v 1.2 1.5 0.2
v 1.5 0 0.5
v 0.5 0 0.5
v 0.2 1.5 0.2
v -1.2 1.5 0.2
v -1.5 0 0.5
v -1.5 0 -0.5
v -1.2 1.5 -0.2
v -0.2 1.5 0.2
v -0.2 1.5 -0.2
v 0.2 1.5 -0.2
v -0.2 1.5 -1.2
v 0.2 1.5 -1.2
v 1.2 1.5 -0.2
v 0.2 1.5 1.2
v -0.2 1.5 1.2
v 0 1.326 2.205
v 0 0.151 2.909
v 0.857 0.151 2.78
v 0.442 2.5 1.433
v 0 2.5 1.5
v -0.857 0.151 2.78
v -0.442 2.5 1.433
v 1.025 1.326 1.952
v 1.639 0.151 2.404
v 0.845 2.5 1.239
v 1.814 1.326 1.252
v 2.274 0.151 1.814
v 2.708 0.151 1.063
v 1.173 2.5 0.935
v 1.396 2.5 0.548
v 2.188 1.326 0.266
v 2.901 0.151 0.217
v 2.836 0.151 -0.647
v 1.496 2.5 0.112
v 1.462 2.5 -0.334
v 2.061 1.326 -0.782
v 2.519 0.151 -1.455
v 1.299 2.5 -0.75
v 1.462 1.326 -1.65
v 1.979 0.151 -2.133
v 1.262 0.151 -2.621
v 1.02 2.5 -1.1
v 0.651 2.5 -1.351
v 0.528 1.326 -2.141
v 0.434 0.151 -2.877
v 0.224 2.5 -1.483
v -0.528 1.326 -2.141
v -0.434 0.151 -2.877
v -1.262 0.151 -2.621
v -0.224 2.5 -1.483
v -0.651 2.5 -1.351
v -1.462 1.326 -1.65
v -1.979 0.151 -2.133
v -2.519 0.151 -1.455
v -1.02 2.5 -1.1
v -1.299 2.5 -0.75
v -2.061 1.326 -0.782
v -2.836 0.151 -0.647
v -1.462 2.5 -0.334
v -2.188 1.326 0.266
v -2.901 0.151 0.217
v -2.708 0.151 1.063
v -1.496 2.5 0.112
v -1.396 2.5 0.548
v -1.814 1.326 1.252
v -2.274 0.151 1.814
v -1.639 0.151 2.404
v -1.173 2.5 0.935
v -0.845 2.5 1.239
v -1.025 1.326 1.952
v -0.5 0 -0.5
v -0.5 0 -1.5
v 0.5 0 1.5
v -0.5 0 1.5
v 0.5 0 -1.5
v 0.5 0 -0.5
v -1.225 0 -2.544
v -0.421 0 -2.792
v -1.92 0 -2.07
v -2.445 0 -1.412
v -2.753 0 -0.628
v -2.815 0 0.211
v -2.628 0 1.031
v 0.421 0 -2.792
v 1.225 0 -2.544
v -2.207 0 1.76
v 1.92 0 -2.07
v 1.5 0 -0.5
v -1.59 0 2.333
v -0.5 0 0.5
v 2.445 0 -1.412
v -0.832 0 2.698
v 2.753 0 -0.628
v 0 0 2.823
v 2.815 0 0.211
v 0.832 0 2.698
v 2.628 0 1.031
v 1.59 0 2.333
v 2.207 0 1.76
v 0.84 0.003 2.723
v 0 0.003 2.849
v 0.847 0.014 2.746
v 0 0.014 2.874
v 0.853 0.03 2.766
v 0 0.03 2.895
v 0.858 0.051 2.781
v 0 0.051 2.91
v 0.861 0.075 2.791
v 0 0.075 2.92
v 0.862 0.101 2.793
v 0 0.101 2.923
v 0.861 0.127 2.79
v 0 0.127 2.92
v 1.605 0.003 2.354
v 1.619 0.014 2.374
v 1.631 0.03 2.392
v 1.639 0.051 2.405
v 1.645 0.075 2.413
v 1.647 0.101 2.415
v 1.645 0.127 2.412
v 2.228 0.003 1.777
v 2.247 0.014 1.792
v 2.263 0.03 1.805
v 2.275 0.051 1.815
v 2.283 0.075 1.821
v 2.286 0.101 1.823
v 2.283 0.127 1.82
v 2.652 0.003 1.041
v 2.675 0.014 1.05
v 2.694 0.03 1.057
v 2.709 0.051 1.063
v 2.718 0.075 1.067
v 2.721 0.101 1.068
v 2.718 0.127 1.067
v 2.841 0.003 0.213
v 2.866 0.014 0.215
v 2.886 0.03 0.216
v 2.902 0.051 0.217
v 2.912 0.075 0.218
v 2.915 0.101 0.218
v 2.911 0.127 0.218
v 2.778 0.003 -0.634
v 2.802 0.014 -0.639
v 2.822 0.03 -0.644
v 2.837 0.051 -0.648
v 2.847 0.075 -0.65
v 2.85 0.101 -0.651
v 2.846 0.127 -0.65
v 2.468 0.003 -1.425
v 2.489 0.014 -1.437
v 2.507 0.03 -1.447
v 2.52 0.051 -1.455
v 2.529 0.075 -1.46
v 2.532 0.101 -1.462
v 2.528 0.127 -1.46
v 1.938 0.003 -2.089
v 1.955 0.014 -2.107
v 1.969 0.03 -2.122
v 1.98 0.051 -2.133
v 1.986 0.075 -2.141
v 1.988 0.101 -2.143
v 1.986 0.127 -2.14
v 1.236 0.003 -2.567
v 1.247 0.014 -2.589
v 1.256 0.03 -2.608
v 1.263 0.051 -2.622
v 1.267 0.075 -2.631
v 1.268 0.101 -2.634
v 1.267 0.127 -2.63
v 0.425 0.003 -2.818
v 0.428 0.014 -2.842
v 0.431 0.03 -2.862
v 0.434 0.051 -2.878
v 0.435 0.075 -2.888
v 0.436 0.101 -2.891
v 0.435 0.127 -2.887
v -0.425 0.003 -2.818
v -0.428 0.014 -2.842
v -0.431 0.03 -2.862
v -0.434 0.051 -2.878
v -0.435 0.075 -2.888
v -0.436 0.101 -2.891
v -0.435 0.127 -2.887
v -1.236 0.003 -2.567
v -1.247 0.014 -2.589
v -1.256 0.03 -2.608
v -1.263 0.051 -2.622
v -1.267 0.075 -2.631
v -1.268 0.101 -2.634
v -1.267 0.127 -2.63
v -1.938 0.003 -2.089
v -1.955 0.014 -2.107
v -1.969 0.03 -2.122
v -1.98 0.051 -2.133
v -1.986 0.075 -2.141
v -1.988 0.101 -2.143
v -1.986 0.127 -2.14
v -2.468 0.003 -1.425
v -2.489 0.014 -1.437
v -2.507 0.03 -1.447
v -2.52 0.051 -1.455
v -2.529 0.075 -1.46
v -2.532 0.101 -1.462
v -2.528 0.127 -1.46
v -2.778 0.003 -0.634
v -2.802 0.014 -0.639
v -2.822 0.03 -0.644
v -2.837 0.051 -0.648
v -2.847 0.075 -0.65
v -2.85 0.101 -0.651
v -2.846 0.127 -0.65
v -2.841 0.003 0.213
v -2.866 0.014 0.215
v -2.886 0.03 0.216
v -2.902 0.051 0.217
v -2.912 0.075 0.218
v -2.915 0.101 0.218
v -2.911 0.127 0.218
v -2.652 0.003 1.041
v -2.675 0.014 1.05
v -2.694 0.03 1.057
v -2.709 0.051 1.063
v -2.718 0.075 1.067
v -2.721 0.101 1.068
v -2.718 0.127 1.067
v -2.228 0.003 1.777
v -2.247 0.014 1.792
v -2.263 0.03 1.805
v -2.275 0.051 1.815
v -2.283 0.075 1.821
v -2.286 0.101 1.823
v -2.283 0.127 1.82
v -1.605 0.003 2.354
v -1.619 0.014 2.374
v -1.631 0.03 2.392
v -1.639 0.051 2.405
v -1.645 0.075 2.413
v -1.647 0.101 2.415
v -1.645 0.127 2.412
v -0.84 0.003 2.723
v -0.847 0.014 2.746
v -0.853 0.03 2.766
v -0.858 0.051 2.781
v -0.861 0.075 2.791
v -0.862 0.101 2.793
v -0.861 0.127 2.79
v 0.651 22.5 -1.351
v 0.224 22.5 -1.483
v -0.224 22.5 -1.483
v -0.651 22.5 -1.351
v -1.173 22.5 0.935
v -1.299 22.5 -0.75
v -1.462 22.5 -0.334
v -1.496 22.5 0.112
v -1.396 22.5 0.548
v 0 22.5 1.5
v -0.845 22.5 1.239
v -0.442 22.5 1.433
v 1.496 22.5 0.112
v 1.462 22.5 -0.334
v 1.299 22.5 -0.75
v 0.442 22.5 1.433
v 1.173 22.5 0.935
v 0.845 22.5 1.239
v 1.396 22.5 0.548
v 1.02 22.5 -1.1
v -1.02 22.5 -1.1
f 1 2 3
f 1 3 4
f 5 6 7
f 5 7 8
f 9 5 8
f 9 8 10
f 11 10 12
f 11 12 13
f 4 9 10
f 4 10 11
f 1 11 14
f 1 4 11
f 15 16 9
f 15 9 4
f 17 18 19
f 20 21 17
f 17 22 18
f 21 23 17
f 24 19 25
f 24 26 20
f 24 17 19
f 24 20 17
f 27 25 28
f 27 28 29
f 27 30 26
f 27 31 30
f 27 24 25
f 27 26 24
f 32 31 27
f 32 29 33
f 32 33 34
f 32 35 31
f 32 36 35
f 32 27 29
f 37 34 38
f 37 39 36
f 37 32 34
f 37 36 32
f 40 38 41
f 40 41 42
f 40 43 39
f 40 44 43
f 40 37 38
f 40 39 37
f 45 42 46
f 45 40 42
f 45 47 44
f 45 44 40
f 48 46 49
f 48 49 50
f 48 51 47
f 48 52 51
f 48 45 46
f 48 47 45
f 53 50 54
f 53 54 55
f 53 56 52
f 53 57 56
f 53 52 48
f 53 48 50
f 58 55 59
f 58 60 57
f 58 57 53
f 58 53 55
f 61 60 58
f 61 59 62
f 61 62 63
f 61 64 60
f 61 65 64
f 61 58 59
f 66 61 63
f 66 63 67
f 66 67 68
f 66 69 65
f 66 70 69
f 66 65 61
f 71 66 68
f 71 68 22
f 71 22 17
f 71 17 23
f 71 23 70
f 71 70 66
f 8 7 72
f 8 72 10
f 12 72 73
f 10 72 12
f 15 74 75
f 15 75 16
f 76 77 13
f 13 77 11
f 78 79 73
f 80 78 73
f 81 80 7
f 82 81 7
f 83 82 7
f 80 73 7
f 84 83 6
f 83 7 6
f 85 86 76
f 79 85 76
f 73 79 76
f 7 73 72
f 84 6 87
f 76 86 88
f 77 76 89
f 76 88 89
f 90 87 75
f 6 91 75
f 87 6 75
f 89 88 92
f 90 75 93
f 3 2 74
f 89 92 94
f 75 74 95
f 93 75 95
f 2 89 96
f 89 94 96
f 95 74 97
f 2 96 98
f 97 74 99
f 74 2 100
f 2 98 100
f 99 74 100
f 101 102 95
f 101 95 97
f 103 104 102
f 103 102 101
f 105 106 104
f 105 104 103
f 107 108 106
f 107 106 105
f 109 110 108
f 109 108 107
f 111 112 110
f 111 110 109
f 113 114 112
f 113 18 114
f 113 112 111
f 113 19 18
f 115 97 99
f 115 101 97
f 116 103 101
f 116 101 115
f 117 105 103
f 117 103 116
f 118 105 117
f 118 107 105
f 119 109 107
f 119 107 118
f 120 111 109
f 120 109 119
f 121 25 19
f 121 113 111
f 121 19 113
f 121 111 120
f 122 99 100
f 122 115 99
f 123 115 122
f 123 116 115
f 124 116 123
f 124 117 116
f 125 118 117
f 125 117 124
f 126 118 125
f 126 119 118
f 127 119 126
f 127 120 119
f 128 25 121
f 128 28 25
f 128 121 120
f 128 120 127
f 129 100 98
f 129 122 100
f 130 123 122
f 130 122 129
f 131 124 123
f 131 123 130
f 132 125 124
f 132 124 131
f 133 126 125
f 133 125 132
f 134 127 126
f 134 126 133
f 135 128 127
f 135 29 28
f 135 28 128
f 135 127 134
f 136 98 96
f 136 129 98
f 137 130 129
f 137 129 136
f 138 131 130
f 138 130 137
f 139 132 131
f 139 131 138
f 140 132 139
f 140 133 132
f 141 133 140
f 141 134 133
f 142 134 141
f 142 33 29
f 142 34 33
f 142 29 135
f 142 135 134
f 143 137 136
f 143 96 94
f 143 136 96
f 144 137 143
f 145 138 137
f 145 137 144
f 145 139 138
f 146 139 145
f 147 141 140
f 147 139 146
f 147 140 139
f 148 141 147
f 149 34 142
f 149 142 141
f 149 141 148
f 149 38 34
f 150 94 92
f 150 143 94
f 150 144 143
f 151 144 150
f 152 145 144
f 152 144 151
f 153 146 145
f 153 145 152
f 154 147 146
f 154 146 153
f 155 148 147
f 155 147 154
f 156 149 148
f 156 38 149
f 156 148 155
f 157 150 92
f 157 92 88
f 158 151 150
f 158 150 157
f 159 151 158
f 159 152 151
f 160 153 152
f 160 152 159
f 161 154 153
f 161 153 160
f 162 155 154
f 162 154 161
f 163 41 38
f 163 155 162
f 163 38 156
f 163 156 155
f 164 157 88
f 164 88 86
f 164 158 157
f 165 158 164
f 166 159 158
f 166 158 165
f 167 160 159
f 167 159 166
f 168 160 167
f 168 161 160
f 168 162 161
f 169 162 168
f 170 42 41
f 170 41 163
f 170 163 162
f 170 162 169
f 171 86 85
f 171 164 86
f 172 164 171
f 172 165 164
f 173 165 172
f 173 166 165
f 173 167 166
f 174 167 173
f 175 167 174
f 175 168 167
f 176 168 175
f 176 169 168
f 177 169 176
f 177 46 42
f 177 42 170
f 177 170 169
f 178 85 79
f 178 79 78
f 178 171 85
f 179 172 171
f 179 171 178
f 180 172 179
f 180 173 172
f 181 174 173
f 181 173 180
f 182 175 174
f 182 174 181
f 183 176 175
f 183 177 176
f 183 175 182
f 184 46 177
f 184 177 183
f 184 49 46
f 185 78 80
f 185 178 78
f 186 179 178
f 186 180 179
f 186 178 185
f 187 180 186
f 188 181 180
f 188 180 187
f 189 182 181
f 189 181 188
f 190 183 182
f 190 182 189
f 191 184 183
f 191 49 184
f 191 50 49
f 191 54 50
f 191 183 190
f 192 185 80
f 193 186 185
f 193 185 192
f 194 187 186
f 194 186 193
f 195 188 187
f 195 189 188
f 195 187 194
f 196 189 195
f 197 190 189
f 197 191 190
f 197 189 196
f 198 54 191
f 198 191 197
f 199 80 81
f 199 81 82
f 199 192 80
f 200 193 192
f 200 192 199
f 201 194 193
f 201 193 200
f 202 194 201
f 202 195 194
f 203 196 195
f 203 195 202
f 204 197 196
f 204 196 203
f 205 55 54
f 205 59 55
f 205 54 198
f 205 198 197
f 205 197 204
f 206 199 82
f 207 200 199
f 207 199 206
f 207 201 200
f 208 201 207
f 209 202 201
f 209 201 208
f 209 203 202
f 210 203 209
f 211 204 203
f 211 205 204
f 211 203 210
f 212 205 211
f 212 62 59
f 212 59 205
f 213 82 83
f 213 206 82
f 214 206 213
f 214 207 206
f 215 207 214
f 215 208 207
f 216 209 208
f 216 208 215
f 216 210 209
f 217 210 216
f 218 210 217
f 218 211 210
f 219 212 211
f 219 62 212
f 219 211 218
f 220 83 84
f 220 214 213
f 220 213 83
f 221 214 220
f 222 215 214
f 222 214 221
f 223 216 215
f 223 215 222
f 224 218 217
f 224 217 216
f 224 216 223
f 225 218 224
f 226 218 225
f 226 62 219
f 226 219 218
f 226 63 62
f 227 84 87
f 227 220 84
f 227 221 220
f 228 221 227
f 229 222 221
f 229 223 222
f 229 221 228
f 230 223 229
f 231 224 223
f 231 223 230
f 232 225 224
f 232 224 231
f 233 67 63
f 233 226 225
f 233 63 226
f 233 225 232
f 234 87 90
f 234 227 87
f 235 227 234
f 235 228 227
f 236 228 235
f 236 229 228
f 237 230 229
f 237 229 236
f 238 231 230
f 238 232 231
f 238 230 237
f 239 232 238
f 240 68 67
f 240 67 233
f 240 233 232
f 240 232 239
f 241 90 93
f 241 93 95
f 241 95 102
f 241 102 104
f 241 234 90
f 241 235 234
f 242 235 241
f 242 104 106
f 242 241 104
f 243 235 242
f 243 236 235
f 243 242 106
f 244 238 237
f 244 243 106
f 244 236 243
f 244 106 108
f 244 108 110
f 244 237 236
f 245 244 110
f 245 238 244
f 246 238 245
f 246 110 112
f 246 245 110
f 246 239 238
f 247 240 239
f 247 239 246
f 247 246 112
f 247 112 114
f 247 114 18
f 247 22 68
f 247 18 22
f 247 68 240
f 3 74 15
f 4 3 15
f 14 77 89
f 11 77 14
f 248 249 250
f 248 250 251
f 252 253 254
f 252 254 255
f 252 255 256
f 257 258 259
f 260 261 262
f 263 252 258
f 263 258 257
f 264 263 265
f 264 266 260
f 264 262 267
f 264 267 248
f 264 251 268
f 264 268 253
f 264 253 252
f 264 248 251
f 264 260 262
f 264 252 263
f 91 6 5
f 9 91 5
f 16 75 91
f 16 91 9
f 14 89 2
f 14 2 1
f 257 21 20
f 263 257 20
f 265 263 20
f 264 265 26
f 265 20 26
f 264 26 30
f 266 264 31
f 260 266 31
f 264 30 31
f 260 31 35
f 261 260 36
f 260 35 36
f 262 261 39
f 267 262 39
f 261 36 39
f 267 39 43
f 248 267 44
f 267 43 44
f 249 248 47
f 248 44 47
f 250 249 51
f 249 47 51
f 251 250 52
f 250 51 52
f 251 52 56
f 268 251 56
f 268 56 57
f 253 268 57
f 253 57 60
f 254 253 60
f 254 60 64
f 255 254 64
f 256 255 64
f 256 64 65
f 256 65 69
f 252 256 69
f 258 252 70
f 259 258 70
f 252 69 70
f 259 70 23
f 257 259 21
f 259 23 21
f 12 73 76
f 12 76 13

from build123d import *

# Parameters (mm, degrees)
SKETCH1_R           = 3
BOSS_EXTRUDE1_DEPTH = 2.5
SKETCH2_R           = 1.5
BOSS_EXTRUDE2_DEPTH = 20
CHAMFER1_SIZE       = 2.5
CHAMFER1_SIZE_2     = 1.5
FILLET1_R           = 0.1
SKETCH3_W           = 1
SKETCH3_H           = 1
CUT_EXTRUDE2_DEPTH  = 1.5
CHAMFER7_SIZE       = 1.5
CHAMFER7_SIZE_2     = 0.3


with BuildPart() as part:
    # Sketch1 → Boss-Extrude1 (new body)
    with BuildSketch(Plane(origin=(0, 0, 0), x_dir=(1, 0, 0), z_dir=(0, 1, 0))):
        with Locations(Location((0, 0, 0), (0, 0, 270))):
            Circle(SKETCH1_R)
    extrude(amount=BOSS_EXTRUDE1_DEPTH)

    # Sketch2 → Boss-Extrude2 (add)
    with BuildSketch(Plane(origin=(0, 2.5, 0), x_dir=(1, 0, 0), z_dir=(0, 1, 0))):
        with Locations(Location((0, 0, 0), (0, 0, 270))):
            Circle(SKETCH2_R)
    extrude(amount=BOSS_EXTRUDE2_DEPTH)

    # Chamfer1
    # the kernel refuses this chamfer: 2.5, 1.5 mm, written as the material it takes off along each edge
    with BuildSketch(Plane(origin=(0, 2.5, 0), x_dir=(0, 0, 1), z_dir=(-1, 0, 0))) as chamfer1_piece_1_section:
        Polygon((3, -CHAMFER1_SIZE), (3 - CHAMFER1_SIZE_2, 0), (3, 0), align=None)
    chamfer1_piece_1 = revolve(axis=Axis((0, 2.5, 0), (0, 1, 0)), mode=Mode.PRIVATE)
    chamfer1_piece_1 = chamfer1_piece_1 - Plane(origin=(0, 2.5, 0), x_dir=(0, 0, 1), z_dir=(0, -1, 0)) * Cylinder(1.5, 12, mode=Mode.PRIVATE)
    add(chamfer1_piece_1, mode=Mode.SUBTRACT)

    # Fillet1
    fillet1_edges = [part.edges().sort_by_distance(p)[0] for p in [
        (0, 0, -3),
    ]]
    fillet(fillet1_edges, radius=FILLET1_R)

    # Sketch3 → Cut-Extrude2 (cut)
    with BuildSketch(Plane.XZ):
        with Locations((0, -1)):
            Rectangle(SKETCH3_W, SKETCH3_H)
        with Locations((-1, 0)):
            Rectangle(SKETCH3_W, SKETCH3_H)
        Rectangle(SKETCH3_W, SKETCH3_H)
        with Locations((0, 1)):
            Rectangle(SKETCH3_W, SKETCH3_H)
        with Locations((1, 0)):
            Rectangle(SKETCH3_W, SKETCH3_H)
    extrude(amount=-CUT_EXTRUDE2_DEPTH, mode=Mode.SUBTRACT)

    # Chamfer7
    # the kernel refuses this chamfer: 1.5, 0.3 mm, written as the material it adds along each edge
    with BuildSketch(Plane(origin=(-0.5, 1.5, -1.5), x_dir=(0, -1, 0), z_dir=(1, 0, 0)), Plane(origin=(0.5, 1.5, 1.5), x_dir=(0, -1, 0), z_dir=(-1, 0, 0)), Plane(origin=(1.5, 1.5, 0.5), x_dir=(0, -1, 0), z_dir=(-1, 0, 0)), Plane(origin=(-0.5, 1.5, 1.5), x_dir=(0, -1, 0), z_dir=(0, 0, -1)), Plane(origin=(-1.5, 1.5, 0.5), x_dir=(0, -1, 0), z_dir=(0, 0, -1)), Plane(origin=(1.5, 1.5, -0.5), x_dir=(0, -1, 0), z_dir=(0, 0, 1)), Plane(origin=(0.5, 1.5, -0.5), x_dir=(0, -1, 0), z_dir=(1, 0, 0)), Plane(origin=(-1.5, 1.5, -0.5), x_dir=(0, -1, 0), z_dir=(1, 0, 0)), Plane(origin=(-0.5, 1.5, -0.5), x_dir=(0, -1, 0), z_dir=(0, 0, -1))) as chamfer7_piece_1:
        Polygon((CHAMFER7_SIZE, 0), (0, -CHAMFER7_SIZE_2), (0, 0), align=None)
    extrude(amount=1)
    with BuildSketch(Plane(origin=(0.5, 1.5, 1.5), x_dir=(0, -1, 0), z_dir=(0, 0, -1)), Plane(origin=(-1.5, 1.5, 0.5), x_dir=(0, -1, 0), z_dir=(1, 0, 0)), Plane(origin=(0.5, 1.5, -0.5), x_dir=(0, -1, 0), z_dir=(0, 0, -1))) as chamfer7_piece_2:
        Polygon((CHAMFER7_SIZE, 0), (0, CHAMFER7_SIZE_2), (0, 0), align=None)
    extrude(amount=1)
    with BuildSketch(Plane(origin=(0.5, 1.5, 5.397198129), x_dir=(0, -1, 0), z_dir=(0, 0, -1))) as chamfer7_piece_3_section:
        Polygon((CHAMFER7_SIZE, 0), (0, CHAMFER7_SIZE_2), (0, 0), align=None)
    chamfer7_piece_3 = extrude(amount=8.794396259, mode=Mode.PRIVATE)
    chamfer7_piece_3 = split(chamfer7_piece_3, bisect_by=Plane(origin=(0.5, 1.5, -0.5), z_dir=(0, 0, -1)), keep=Keep.TOP, mode=Mode.PRIVATE)
    chamfer7_piece_3 = split(chamfer7_piece_3, bisect_by=Plane(origin=(0.5, 1.5, -1.5), z_dir=(0, 0, 1)), keep=Keep.TOP, mode=Mode.PRIVATE)
    add(chamfer7_piece_3)
    with BuildSketch(Plane(origin=(5.397198129, 1.5, 0.5), x_dir=(0, -1, 0), z_dir=(-1, 0, 0))) as chamfer7_piece_4_section:
        Polygon((CHAMFER7_SIZE, 0), (0, -CHAMFER7_SIZE_2), (0, 0), align=None)
    chamfer7_piece_4 = extrude(amount=8.794396259, mode=Mode.PRIVATE)
    chamfer7_piece_4 = split(chamfer7_piece_4, bisect_by=Plane(origin=(-1.5, 1.5, 0.5), z_dir=(1, 0, 0)), keep=Keep.TOP, mode=Mode.PRIVATE)
    chamfer7_piece_4 = split(chamfer7_piece_4, bisect_by=Plane(origin=(-0.5, 1.5, 0.5), z_dir=(-1, 0, 0)), keep=Keep.TOP, mode=Mode.PRIVATE)
    add(chamfer7_piece_4)
    with BuildSketch(Plane(origin=(-0.5, 1.5, 5.397198129), x_dir=(0, -1, 0), z_dir=(0, 0, -1))) as chamfer7_piece_5_section:
        Polygon((CHAMFER7_SIZE, 0), (0, -CHAMFER7_SIZE_2), (0, 0), align=None)
    chamfer7_piece_5 = extrude(amount=8.794396259, mode=Mode.PRIVATE)
    chamfer7_piece_5 = split(chamfer7_piece_5, bisect_by=Plane(origin=(-0.5, 1.5, -0.5), z_dir=(0, 0, -1)), keep=Keep.TOP, mode=Mode.PRIVATE)
    chamfer7_piece_5 = split(chamfer7_piece_5, bisect_by=Plane(origin=(-0.5, 1.5, -1.5), z_dir=(0, 0, 1)), keep=Keep.TOP, mode=Mode.PRIVATE)
    add(chamfer7_piece_5)
    with BuildSketch(Plane(origin=(-5.397198129, 1.5, 0.5), x_dir=(0, -1, 0), z_dir=(1, 0, 0))) as chamfer7_piece_6_section:
        Polygon((CHAMFER7_SIZE, 0), (0, CHAMFER7_SIZE_2), (0, 0), align=None)
    chamfer7_piece_6 = extrude(amount=8.794396259, mode=Mode.PRIVATE)
    chamfer7_piece_6 = split(chamfer7_piece_6, bisect_by=Plane(origin=(0.5, 1.5, 0.5), z_dir=(1, 0, 0)), keep=Keep.TOP, mode=Mode.PRIVATE)
    chamfer7_piece_6 = split(chamfer7_piece_6, bisect_by=Plane(origin=(1.5, 1.5, 0.5), z_dir=(-1, 0, 0)), keep=Keep.TOP, mode=Mode.PRIVATE)
    add(chamfer7_piece_6)
    with BuildSketch(Plane(origin=(-3.397198129, 1.5, -0.5), x_dir=(0, -1, 0), z_dir=(1, 0, 0))) as chamfer7_piece_7_section:
        Polygon((CHAMFER7_SIZE, 0), (0, -CHAMFER7_SIZE_2), (0, 0), align=None)
    chamfer7_piece_7 = extrude(amount=8.794396259, mode=Mode.PRIVATE)
    chamfer7_piece_7 = split(chamfer7_piece_7, bisect_by=Plane(origin=(-1.5, 1.5, -0.5), z_dir=(1, 0, 0)), keep=Keep.TOP, mode=Mode.PRIVATE)
    chamfer7_piece_7 = split(chamfer7_piece_7, bisect_by=Plane(origin=(-0.5, 1.5, -0.5), z_dir=(-1, 0, 0)), keep=Keep.TOP, mode=Mode.PRIVATE)
    add(chamfer7_piece_7)
    with BuildSketch(Plane(origin=(0.5, 1.5, 3.397198129), x_dir=(0, -1, 0), z_dir=(0, 0, -1))) as chamfer7_piece_8_section:
        Polygon((CHAMFER7_SIZE, 0), (0, CHAMFER7_SIZE_2), (0, 0), align=None)
    chamfer7_piece_8 = extrude(amount=8.794396259, mode=Mode.PRIVATE)
    chamfer7_piece_8 = split(chamfer7_piece_8, bisect_by=Plane(origin=(0.5, 1.5, 1.5), z_dir=(0, 0, -1)), keep=Keep.TOP, mode=Mode.PRIVATE)
    chamfer7_piece_8 = split(chamfer7_piece_8, bisect_by=Plane(origin=(0.5, 1.5, 0.5), z_dir=(0, 0, 1)), keep=Keep.TOP, mode=Mode.PRIVATE)
    add(chamfer7_piece_8)
    with BuildSketch(Plane(origin=(-5.397198129, 1.5, -0.5), x_dir=(0, -1, 0), z_dir=(1, 0, 0))) as chamfer7_piece_9_section:
        Polygon((CHAMFER7_SIZE, 0), (0, -CHAMFER7_SIZE_2), (0, 0), align=None)
    chamfer7_piece_9 = extrude(amount=8.794396259, mode=Mode.PRIVATE)
    chamfer7_piece_9 = split(chamfer7_piece_9, bisect_by=Plane(origin=(1.5, 1.5, -0.5), z_dir=(-1, 0, 0)), keep=Keep.TOP, mode=Mode.PRIVATE)
    chamfer7_piece_9 = split(chamfer7_piece_9, bisect_by=Plane(origin=(0.5, 1.5, -0.5), z_dir=(1, 0, 0)), keep=Keep.TOP, mode=Mode.PRIVATE)
    add(chamfer7_piece_9)
    with BuildSketch(Plane(origin=(-0.5, 1.5, 3.397198129), x_dir=(0, -1, 0), z_dir=(0, 0, -1))) as chamfer7_piece_10_section:
        Polygon((CHAMFER7_SIZE, 0), (0, -CHAMFER7_SIZE_2), (0, 0), align=None)
    chamfer7_piece_10 = extrude(amount=8.794396259, mode=Mode.PRIVATE)
    chamfer7_piece_10 = split(chamfer7_piece_10, bisect_by=Plane(origin=(-0.5, 1.5, 0.5), z_dir=(0, 0, 1)), keep=Keep.TOP, mode=Mode.PRIVATE)
    chamfer7_piece_10 = split(chamfer7_piece_10, bisect_by=Plane(origin=(-0.5, 1.5, 1.5), z_dir=(0, 0, -1)), keep=Keep.TOP, mode=Mode.PRIVATE)
    add(chamfer7_piece_10)
    with BuildSketch(Plane(origin=(0.5, 1.5, 1.5), x_dir=(0, -1, 0), z_dir=(0, 0, -1))) as chamfer7_piece_11a_section:
        Polygon((CHAMFER7_SIZE, 0), (0, CHAMFER7_SIZE_2), (0, 0), align=None)
    chamfer7_piece_11a = extrude(amount=4.897198129, mode=Mode.PRIVATE)
    chamfer7_piece_11a = split(chamfer7_piece_11a, bisect_by=Plane(origin=(0.5, 1.5, 0.5), z_dir=(0, 0, -1)), keep=Keep.TOP, mode=Mode.PRIVATE)
    chamfer7_piece_11a = split(chamfer7_piece_11a, bisect_by=Plane(origin=(0.5, 1.5, -0.5), z_dir=(0, 0, 1)), keep=Keep.TOP, mode=Mode.PRIVATE)
    with BuildSketch(Plane(origin=(1.5, 1.5, 0.5), x_dir=(0, -1, 0), z_dir=(-1, 0, 0))) as chamfer7_piece_11b_section:
        Polygon((CHAMFER7_SIZE, 0), (0, -CHAMFER7_SIZE_2), (0, 0), align=None)
    chamfer7_piece_11b = extrude(amount=4.897198129, mode=Mode.PRIVATE)
    chamfer7_piece_11b = split(chamfer7_piece_11b, bisect_by=Plane(origin=(-0.5, 1.5, 0.5), z_dir=(1, 0, 0)), keep=Keep.TOP, mode=Mode.PRIVATE)
    chamfer7_piece_11b = split(chamfer7_piece_11b, bisect_by=Plane(origin=(0.5, 1.5, 0.5), z_dir=(-1, 0, 0)), keep=Keep.TOP, mode=Mode.PRIVATE)
    chamfer7_piece_11 = chamfer7_piece_11a & chamfer7_piece_11b
    add(chamfer7_piece_11)
    with BuildSketch(Plane(origin=(-1.5, 1.5, 0.5), x_dir=(0, -1, 0), z_dir=(1, 0, 0))) as chamfer7_piece_12a_section:
        Polygon((CHAMFER7_SIZE, 0), (0, CHAMFER7_SIZE_2), (0, 0), align=None)
    chamfer7_piece_12a = extrude(amount=4.897198129, mode=Mode.PRIVATE)
    chamfer7_piece_12a = split(chamfer7_piece_12a, bisect_by=Plane(origin=(-0.5, 1.5, 0.5), z_dir=(1, 0, 0)), keep=Keep.TOP, mode=Mode.PRIVATE)
    chamfer7_piece_12a = split(chamfer7_piece_12a, bisect_by=Plane(origin=(0.5, 1.5, 0.5), z_dir=(-1, 0, 0)), keep=Keep.TOP, mode=Mode.PRIVATE)
    with BuildSketch(Plane(origin=(-0.5, 1.5, 1.5), x_dir=(0, -1, 0), z_dir=(0, 0, -1))) as chamfer7_piece_12b_section:
        Polygon((CHAMFER7_SIZE, 0), (0, -CHAMFER7_SIZE_2), (0, 0), align=None)
    chamfer7_piece_12b = extrude(amount=4.897198129, mode=Mode.PRIVATE)
    chamfer7_piece_12b = split(chamfer7_piece_12b, bisect_by=Plane(origin=(-0.5, 1.5, -0.5), z_dir=(0, 0, 1)), keep=Keep.TOP, mode=Mode.PRIVATE)
    chamfer7_piece_12b = split(chamfer7_piece_12b, bisect_by=Plane(origin=(-0.5, 1.5, 0.5), z_dir=(0, 0, -1)), keep=Keep.TOP, mode=Mode.PRIVATE)
    chamfer7_piece_12 = chamfer7_piece_12a & chamfer7_piece_12b
    add(chamfer7_piece_12)
    with BuildSketch(Plane(origin=(-3.397198129, 1.5, -0.5), x_dir=(0, -1, 0), z_dir=(1, 0, 0))) as chamfer7_piece_13a_section:
        Polygon((CHAMFER7_SIZE, 0), (0, -CHAMFER7_SIZE_2), (0, 0), align=None)
    chamfer7_piece_13a = extrude(amount=4.897198129, mode=Mode.PRIVATE)
    chamfer7_piece_13a = split(chamfer7_piece_13a, bisect_by=Plane(origin=(0.5, 1.5, -0.5), z_dir=(-1, 0, 0)), keep=Keep.TOP, mode=Mode.PRIVATE)
    chamfer7_piece_13a = split(chamfer7_piece_13a, bisect_by=Plane(origin=(-0.5, 1.5, -0.5), z_dir=(1, 0, 0)), keep=Keep.TOP, mode=Mode.PRIVATE)
    with BuildSketch(Plane(origin=(0.5, 1.5, 3.397198129), x_dir=(0, -1, 0), z_dir=(0, 0, -1))) as chamfer7_piece_13b_section:
        Polygon((CHAMFER7_SIZE, 0), (0, CHAMFER7_SIZE_2), (0, 0), align=None)
    chamfer7_piece_13b = extrude(amount=4.897198129, mode=Mode.PRIVATE)
    chamfer7_piece_13b = split(chamfer7_piece_13b, bisect_by=Plane(origin=(0.5, 1.5, 0.5), z_dir=(0, 0, -1)), keep=Keep.TOP, mode=Mode.PRIVATE)
    chamfer7_piece_13b = split(chamfer7_piece_13b, bisect_by=Plane(origin=(0.5, 1.5, -0.5), z_dir=(0, 0, 1)), keep=Keep.TOP, mode=Mode.PRIVATE)
    chamfer7_piece_13 = chamfer7_piece_13a & chamfer7_piece_13b
    add(chamfer7_piece_13)
    with BuildSketch(Plane(origin=(-1.5, 1.5, -0.5), x_dir=(0, -1, 0), z_dir=(1, 0, 0))) as chamfer7_piece_14a_section:
        Polygon((CHAMFER7_SIZE, 0), (0, -CHAMFER7_SIZE_2), (0, 0), align=None)
    chamfer7_piece_14a = extrude(amount=4.897198129, mode=Mode.PRIVATE)
    chamfer7_piece_14a = split(chamfer7_piece_14a, bisect_by=Plane(origin=(0.5, 1.5, -0.5), z_dir=(-1, 0, 0)), keep=Keep.TOP, mode=Mode.PRIVATE)
    chamfer7_piece_14a = split(chamfer7_piece_14a, bisect_by=Plane(origin=(-0.5, 1.5, -0.5), z_dir=(1, 0, 0)), keep=Keep.TOP, mode=Mode.PRIVATE)
    with BuildSketch(Plane(origin=(-0.5, 1.5, 3.397198129), x_dir=(0, -1, 0), z_dir=(0, 0, -1))) as chamfer7_piece_14b_section:
        Polygon((CHAMFER7_SIZE, 0), (0, -CHAMFER7_SIZE_2), (0, 0), align=None)
    chamfer7_piece_14b = extrude(amount=4.897198129, mode=Mode.PRIVATE)
    chamfer7_piece_14b = split(chamfer7_piece_14b, bisect_by=Plane(origin=(-0.5, 1.5, -0.5), z_dir=(0, 0, 1)), keep=Keep.TOP, mode=Mode.PRIVATE)
    chamfer7_piece_14b = split(chamfer7_piece_14b, bisect_by=Plane(origin=(-0.5, 1.5, 0.5), z_dir=(0, 0, -1)), keep=Keep.TOP, mode=Mode.PRIVATE)
    chamfer7_piece_14 = chamfer7_piece_14a & chamfer7_piece_14b
    add(chamfer7_piece_14)


solid = part.part
